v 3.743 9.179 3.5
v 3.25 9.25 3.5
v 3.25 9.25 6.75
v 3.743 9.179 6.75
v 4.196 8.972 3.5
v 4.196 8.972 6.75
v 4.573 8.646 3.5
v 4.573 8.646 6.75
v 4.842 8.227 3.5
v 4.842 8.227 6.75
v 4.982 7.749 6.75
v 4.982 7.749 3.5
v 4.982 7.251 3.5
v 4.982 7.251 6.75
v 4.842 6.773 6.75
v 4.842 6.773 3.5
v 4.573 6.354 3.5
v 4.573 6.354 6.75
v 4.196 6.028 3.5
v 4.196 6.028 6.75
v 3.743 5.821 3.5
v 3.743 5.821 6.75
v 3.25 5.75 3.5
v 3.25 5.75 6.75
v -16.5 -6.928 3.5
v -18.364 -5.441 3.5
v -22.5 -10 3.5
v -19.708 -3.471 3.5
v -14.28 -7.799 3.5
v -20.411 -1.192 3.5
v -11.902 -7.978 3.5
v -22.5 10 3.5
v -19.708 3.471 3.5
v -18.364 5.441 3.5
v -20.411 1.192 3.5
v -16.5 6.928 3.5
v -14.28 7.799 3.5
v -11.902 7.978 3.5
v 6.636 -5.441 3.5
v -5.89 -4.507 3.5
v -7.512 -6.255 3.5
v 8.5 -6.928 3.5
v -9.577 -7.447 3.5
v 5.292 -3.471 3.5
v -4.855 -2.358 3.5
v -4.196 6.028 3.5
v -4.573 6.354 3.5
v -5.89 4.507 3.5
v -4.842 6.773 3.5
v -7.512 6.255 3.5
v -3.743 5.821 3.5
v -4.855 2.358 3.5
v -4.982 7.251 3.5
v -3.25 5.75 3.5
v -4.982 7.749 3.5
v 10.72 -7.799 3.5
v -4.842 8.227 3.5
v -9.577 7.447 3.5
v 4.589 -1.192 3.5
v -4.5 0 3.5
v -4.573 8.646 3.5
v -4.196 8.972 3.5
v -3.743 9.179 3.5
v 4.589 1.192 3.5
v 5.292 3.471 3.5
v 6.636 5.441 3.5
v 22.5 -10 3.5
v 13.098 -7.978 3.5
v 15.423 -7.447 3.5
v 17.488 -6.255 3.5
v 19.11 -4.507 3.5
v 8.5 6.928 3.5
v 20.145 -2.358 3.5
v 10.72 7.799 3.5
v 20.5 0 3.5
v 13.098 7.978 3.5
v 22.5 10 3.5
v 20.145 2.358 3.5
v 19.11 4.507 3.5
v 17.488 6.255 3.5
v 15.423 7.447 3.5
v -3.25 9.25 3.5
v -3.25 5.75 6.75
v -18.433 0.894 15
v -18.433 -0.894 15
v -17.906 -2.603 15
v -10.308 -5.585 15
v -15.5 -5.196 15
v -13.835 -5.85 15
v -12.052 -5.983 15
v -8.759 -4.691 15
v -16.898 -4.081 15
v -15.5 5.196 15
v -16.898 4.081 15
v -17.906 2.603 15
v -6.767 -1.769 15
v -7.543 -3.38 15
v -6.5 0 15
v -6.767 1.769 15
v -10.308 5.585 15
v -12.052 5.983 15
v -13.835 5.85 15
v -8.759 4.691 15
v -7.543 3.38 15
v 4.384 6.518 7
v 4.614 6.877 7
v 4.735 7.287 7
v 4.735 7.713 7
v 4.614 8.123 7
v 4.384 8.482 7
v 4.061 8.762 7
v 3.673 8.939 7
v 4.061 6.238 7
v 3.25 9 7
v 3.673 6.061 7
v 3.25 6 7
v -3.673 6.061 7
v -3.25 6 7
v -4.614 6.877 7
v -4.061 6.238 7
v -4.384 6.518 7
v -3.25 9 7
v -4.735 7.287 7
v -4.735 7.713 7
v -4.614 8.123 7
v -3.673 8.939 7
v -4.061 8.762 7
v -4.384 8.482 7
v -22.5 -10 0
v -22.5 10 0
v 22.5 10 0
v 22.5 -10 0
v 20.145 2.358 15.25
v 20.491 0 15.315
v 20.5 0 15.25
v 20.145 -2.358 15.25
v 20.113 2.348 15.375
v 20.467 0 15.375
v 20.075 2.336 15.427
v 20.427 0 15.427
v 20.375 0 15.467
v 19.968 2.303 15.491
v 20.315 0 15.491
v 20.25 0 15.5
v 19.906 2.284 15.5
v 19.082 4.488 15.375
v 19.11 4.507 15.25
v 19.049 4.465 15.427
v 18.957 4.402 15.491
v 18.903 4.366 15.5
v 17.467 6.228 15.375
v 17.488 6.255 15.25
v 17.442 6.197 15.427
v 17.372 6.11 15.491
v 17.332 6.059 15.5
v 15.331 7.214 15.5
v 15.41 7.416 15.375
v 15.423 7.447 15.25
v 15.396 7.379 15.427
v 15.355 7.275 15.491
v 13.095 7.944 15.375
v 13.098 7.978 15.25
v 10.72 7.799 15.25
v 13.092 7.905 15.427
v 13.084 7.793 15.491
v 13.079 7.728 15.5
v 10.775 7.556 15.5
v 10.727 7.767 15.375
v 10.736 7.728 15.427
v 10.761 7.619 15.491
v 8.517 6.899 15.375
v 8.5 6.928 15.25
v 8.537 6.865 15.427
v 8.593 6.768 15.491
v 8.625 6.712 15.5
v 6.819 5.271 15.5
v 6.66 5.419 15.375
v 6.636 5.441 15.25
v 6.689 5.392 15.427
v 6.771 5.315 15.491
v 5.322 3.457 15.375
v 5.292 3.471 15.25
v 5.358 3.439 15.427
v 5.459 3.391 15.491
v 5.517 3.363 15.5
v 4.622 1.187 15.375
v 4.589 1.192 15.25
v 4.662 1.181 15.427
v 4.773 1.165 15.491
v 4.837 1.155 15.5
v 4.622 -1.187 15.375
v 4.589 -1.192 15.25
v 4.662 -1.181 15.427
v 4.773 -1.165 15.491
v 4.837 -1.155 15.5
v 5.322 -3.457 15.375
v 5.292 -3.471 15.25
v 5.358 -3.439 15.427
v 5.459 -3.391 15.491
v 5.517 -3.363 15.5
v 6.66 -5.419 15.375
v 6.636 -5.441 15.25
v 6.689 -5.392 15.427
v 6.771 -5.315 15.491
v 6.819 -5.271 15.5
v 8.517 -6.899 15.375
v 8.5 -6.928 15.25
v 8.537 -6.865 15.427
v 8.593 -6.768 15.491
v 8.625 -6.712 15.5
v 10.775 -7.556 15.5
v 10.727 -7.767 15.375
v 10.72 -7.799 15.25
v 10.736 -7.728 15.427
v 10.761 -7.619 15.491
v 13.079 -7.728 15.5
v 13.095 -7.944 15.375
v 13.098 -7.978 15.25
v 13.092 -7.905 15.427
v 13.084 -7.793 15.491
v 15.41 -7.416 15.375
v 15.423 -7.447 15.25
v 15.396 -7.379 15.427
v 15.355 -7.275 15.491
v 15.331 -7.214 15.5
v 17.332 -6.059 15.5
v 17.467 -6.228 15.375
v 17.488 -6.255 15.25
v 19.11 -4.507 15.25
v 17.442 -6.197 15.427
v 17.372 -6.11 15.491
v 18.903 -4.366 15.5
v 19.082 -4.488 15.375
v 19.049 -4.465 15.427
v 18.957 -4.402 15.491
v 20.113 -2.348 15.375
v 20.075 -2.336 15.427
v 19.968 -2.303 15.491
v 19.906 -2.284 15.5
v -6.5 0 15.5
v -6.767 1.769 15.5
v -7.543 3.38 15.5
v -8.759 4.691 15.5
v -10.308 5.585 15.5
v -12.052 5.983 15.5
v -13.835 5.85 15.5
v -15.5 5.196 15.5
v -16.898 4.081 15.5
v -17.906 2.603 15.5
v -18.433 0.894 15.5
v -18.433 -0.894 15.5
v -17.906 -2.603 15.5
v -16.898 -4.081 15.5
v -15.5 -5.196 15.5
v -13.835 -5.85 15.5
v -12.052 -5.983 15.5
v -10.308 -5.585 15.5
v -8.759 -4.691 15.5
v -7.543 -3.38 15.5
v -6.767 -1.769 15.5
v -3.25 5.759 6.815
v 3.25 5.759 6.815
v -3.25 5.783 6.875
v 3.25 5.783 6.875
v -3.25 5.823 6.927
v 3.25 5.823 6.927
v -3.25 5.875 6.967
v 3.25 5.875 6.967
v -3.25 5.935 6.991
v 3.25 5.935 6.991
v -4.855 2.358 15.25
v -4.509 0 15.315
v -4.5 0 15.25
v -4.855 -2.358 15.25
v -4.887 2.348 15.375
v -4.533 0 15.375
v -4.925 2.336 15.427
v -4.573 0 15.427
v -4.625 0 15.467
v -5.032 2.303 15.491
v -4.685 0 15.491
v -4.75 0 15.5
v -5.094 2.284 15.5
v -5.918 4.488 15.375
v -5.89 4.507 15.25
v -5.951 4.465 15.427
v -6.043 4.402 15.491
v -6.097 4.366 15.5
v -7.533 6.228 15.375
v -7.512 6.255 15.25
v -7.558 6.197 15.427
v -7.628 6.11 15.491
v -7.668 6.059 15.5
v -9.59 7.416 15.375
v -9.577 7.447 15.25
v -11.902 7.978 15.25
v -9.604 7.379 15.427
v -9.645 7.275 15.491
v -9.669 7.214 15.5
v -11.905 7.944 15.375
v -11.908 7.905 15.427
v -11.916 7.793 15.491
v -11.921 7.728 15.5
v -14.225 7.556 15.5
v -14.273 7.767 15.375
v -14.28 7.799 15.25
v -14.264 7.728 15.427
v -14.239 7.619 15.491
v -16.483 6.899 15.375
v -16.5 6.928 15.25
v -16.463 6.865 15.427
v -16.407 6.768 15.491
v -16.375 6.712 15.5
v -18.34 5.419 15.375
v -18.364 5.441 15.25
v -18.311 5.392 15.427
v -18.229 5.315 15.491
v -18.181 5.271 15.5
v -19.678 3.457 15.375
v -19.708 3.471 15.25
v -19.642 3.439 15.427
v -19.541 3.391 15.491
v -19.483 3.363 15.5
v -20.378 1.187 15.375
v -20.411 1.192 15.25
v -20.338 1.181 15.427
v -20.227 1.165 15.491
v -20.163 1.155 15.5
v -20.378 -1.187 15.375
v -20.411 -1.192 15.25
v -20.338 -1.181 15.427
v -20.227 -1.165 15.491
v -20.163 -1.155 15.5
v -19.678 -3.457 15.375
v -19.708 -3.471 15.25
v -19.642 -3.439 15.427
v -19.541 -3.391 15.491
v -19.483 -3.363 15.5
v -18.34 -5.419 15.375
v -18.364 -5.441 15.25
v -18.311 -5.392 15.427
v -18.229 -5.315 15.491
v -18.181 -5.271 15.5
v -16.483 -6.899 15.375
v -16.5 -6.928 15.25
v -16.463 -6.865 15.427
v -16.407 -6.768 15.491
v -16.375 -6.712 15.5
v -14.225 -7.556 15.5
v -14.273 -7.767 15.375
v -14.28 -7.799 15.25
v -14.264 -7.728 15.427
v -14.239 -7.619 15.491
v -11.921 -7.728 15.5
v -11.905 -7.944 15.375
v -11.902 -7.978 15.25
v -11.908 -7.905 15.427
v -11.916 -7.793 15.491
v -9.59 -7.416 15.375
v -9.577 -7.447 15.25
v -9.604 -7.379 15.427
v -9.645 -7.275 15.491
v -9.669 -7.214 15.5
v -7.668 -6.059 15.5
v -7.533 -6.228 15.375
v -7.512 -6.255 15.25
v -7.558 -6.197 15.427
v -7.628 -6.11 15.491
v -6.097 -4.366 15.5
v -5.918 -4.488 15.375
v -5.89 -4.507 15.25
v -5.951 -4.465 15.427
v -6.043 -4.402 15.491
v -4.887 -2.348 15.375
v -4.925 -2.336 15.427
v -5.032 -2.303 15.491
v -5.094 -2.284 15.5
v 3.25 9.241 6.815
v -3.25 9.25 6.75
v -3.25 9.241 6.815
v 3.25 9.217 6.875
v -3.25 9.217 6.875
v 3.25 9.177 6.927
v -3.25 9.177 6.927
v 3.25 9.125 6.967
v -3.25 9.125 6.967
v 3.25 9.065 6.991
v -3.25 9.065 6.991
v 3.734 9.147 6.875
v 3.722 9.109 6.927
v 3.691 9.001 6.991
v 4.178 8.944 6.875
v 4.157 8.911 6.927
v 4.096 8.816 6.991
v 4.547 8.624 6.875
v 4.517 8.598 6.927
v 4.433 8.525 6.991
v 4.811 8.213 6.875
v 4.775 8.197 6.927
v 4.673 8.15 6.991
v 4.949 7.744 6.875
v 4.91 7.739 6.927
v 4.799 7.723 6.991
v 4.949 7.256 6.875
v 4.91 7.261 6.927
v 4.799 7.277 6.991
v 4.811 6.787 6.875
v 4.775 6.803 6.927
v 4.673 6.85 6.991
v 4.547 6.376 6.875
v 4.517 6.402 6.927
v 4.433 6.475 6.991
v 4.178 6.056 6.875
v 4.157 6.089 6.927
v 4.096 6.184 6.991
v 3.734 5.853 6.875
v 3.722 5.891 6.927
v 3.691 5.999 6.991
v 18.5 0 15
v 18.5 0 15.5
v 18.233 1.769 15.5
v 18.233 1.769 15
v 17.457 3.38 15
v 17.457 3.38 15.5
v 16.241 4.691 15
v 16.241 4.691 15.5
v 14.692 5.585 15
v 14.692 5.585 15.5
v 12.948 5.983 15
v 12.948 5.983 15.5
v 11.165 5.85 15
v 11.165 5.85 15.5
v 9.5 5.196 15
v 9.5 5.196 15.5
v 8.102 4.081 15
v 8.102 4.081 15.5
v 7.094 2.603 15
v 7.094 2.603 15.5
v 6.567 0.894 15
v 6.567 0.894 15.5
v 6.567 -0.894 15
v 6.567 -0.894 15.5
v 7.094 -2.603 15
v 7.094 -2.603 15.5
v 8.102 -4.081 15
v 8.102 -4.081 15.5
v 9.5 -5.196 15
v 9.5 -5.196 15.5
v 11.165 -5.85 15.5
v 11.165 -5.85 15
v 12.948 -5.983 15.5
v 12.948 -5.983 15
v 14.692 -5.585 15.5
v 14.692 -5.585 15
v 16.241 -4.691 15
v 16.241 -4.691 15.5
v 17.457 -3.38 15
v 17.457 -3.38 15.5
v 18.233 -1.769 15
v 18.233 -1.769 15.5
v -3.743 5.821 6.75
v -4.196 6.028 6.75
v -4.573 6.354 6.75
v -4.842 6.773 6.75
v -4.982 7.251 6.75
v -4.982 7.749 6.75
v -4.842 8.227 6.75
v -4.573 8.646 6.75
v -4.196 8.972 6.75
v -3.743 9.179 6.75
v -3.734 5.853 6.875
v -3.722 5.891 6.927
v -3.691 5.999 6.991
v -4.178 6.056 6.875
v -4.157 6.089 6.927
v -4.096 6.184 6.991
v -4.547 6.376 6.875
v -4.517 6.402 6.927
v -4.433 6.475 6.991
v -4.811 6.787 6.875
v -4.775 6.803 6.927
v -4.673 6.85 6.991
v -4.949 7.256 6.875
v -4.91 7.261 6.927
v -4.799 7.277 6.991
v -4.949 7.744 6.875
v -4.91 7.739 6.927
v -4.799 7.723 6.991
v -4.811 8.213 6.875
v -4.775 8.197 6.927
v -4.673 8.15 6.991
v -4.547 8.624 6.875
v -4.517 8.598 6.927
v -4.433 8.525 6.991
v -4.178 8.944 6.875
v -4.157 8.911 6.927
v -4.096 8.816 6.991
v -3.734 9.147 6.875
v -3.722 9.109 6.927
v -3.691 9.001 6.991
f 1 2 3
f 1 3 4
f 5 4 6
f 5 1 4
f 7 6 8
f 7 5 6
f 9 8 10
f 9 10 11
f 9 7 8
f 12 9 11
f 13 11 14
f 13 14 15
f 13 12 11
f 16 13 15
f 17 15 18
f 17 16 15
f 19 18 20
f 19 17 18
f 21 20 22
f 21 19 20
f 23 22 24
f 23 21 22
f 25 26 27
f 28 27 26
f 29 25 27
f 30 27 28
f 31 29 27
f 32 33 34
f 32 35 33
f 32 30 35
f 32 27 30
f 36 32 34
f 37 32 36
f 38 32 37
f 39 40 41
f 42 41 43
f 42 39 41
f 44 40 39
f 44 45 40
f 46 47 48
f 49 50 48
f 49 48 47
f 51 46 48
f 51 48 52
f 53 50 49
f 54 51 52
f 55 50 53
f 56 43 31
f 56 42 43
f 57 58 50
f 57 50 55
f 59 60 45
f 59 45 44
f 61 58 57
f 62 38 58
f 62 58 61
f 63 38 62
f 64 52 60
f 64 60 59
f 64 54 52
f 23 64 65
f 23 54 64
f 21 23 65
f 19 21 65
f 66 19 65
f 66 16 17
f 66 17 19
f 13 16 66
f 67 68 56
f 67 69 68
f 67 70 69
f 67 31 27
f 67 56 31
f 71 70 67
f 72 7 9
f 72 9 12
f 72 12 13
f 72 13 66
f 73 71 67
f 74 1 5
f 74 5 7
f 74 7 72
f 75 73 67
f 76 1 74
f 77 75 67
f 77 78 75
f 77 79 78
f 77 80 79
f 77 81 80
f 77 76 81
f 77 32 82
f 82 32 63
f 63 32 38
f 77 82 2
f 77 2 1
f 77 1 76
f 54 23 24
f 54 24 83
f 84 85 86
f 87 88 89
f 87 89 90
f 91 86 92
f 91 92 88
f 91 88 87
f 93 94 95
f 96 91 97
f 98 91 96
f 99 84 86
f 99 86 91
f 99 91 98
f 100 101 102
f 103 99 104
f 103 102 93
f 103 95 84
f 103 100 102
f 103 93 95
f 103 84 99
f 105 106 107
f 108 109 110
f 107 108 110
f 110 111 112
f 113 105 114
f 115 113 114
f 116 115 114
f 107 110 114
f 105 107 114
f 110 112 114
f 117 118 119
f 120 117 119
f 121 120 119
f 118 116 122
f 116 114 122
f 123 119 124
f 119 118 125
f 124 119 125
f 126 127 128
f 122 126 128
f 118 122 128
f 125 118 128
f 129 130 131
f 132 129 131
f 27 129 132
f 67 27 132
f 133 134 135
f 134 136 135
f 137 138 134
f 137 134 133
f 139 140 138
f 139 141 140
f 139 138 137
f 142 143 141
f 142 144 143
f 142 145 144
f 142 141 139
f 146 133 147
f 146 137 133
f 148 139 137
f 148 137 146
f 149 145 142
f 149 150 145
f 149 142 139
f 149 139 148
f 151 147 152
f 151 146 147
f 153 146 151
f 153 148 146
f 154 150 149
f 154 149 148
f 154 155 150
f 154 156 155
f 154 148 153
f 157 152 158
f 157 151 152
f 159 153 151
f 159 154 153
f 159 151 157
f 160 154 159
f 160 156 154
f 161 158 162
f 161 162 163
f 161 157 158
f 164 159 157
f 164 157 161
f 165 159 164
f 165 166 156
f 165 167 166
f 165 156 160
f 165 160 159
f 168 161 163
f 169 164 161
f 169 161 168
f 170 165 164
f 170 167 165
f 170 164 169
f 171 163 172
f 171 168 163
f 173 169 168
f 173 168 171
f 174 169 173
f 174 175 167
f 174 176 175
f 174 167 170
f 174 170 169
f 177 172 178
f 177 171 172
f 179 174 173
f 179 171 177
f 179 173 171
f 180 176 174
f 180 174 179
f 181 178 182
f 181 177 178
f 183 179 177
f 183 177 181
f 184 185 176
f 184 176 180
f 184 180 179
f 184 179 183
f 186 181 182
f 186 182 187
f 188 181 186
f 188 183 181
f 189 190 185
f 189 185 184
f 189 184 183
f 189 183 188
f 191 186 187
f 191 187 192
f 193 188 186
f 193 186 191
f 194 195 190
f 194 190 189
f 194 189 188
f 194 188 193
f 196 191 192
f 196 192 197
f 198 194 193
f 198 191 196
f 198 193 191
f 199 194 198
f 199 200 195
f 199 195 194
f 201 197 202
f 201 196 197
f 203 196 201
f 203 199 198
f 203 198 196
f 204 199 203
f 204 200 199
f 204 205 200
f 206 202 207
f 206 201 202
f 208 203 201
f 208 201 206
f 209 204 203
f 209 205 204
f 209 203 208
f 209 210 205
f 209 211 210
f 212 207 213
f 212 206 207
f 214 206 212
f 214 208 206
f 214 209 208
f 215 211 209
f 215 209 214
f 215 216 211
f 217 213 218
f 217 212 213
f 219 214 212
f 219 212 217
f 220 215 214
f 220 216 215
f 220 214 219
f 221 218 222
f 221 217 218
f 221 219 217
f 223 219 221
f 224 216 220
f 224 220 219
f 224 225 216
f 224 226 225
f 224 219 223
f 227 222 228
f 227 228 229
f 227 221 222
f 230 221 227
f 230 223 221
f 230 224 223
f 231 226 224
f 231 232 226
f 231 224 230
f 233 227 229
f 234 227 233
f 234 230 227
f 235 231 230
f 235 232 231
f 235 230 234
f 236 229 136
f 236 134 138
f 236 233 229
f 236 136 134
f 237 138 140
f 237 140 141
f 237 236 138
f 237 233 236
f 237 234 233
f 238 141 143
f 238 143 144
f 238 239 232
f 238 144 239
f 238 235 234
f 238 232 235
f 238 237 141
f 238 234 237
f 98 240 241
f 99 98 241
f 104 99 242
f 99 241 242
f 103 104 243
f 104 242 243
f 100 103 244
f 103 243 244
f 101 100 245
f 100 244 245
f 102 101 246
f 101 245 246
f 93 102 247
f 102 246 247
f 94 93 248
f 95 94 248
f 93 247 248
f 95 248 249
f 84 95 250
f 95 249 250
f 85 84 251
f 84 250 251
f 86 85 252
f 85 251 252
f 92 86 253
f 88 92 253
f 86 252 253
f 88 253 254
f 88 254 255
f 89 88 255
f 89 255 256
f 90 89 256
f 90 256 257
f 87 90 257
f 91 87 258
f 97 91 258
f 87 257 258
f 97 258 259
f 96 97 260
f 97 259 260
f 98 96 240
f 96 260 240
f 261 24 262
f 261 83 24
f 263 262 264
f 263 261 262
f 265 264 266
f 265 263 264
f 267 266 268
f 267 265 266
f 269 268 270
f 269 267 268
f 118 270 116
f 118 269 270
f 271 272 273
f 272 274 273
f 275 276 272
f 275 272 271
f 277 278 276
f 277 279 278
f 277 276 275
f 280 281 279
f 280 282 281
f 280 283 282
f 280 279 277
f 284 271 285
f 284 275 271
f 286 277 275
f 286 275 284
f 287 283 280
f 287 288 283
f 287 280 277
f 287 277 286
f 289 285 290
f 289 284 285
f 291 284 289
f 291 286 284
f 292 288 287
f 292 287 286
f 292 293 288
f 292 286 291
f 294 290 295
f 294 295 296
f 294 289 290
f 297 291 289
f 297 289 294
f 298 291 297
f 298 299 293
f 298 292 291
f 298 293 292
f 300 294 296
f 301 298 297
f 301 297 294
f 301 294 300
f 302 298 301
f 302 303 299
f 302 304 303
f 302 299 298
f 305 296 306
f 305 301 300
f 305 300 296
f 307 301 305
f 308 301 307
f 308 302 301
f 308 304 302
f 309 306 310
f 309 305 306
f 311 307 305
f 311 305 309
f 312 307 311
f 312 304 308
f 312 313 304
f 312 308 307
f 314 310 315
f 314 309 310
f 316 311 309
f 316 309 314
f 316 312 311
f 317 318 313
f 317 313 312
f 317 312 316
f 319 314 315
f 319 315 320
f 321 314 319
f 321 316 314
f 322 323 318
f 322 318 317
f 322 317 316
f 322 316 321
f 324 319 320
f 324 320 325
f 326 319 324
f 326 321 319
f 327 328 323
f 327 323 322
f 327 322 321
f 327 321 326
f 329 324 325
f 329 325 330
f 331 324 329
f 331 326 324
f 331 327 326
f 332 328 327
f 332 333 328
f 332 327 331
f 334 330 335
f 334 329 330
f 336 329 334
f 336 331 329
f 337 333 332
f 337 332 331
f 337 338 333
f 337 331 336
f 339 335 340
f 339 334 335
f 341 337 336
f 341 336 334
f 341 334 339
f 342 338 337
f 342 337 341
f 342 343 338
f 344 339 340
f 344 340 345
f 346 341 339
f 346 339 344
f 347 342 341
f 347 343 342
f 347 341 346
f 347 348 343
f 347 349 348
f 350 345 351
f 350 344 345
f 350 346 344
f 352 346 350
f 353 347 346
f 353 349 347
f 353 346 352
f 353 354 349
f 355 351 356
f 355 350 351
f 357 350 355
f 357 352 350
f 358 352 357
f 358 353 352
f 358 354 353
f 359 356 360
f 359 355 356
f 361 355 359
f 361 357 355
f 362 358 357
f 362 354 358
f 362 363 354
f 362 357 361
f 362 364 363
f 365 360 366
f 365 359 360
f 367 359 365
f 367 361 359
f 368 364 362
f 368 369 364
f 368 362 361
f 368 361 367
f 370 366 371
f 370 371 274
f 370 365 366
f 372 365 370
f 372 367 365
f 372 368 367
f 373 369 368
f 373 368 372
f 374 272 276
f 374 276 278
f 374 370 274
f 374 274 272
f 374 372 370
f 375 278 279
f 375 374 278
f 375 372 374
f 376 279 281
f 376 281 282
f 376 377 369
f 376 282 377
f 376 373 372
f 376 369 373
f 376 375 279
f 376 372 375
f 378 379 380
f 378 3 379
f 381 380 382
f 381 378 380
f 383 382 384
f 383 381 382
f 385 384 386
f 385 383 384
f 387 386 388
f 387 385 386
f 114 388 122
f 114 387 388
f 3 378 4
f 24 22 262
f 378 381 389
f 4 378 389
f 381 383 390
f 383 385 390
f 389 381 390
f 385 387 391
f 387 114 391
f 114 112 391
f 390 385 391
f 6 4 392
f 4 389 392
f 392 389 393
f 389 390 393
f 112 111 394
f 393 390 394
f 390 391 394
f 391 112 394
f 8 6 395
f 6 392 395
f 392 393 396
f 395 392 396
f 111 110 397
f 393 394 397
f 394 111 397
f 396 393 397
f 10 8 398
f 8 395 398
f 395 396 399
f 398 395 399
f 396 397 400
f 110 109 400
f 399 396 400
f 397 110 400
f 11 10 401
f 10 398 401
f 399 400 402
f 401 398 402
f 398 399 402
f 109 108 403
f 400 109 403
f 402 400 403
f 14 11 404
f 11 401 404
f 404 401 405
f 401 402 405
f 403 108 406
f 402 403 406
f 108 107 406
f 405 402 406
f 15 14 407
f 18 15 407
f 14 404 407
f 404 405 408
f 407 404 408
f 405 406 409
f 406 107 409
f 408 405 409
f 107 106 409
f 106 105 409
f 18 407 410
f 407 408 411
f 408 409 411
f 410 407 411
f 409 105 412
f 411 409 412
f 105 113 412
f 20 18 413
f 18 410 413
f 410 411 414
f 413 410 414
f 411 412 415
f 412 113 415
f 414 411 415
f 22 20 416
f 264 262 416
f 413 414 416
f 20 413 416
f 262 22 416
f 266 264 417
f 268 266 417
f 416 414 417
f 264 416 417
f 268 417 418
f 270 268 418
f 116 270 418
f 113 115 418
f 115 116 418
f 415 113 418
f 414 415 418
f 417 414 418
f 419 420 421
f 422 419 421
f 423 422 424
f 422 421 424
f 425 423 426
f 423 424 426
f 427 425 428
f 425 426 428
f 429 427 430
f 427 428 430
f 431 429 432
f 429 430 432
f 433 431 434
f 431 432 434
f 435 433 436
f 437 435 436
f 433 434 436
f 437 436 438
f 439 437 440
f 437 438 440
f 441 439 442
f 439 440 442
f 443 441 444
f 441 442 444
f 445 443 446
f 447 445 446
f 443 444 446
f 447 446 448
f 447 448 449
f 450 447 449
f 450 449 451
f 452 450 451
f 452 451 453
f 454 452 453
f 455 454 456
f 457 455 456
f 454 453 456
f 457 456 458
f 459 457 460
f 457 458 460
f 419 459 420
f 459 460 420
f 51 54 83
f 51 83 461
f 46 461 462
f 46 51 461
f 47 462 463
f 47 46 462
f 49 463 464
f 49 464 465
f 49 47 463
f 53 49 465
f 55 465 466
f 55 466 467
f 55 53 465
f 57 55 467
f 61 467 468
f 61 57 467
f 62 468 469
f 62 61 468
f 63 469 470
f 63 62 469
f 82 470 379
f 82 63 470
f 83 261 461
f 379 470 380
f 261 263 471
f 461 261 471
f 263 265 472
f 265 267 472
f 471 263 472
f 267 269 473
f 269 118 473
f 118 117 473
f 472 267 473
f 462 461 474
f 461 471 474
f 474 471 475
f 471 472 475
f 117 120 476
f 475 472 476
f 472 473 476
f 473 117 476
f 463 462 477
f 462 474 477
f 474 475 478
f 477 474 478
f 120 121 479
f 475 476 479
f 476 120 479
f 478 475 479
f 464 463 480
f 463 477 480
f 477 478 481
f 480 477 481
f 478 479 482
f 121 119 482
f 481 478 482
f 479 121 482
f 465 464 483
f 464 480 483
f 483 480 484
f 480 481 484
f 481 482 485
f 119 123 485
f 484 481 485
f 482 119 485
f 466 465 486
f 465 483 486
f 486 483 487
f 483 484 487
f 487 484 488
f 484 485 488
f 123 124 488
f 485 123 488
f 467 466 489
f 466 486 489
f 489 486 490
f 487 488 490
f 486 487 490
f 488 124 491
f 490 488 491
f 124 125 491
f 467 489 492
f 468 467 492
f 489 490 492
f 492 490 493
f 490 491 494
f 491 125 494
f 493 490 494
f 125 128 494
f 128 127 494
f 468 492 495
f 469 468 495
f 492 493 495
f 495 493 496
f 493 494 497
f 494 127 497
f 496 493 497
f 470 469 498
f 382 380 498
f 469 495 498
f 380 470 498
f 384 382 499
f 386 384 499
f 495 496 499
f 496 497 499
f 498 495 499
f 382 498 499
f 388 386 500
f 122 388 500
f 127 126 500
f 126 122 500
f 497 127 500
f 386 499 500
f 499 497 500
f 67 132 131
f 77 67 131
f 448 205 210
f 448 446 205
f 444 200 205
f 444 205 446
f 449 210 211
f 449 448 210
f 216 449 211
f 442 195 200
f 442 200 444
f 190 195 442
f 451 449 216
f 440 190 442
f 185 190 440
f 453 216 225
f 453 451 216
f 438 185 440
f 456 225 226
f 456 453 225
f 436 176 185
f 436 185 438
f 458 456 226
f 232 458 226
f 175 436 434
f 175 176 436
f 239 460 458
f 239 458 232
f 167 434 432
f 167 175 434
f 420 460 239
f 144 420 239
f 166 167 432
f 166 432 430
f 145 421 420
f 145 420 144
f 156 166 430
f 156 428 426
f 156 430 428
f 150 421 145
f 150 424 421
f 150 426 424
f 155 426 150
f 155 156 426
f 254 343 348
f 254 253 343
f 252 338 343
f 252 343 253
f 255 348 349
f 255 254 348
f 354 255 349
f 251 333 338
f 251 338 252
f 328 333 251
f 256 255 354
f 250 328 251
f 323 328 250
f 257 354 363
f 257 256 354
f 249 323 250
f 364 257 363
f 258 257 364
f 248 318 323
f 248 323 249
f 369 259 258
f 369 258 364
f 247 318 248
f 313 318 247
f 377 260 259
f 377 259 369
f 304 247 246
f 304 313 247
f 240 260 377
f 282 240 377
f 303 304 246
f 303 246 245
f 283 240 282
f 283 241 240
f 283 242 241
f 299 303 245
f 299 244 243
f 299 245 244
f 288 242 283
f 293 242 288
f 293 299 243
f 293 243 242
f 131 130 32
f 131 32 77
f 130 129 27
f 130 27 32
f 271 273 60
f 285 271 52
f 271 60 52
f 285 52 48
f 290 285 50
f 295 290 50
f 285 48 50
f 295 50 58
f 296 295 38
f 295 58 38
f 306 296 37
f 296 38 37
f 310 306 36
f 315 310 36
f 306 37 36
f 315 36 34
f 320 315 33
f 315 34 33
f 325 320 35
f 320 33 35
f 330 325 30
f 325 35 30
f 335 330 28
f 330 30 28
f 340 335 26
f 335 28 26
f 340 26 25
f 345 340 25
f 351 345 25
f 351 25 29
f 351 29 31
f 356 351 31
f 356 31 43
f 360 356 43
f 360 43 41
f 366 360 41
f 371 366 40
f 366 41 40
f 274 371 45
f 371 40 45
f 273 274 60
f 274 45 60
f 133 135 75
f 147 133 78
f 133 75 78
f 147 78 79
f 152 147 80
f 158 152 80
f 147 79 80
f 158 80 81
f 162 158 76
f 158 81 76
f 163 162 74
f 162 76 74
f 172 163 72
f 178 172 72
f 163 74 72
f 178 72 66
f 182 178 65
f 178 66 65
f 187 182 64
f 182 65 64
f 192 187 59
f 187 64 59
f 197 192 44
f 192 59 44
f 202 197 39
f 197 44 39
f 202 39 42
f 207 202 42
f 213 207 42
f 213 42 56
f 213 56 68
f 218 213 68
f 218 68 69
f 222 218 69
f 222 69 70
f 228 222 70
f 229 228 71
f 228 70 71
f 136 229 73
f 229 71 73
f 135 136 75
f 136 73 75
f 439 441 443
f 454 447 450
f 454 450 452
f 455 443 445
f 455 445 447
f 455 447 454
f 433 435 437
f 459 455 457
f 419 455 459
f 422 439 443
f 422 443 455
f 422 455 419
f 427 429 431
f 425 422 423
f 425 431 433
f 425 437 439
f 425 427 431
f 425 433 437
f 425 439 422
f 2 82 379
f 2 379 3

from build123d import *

# Parameters (mm, degrees)
SKETCH1_W           = 45
SKETCH1_H           = 20
BOSS_EXTRUDE1_DEPTH = 3.5
SKETCH2_R           = 8
BOSS_EXTRUDE2_DEPTH = 12
SKETCH3_R           = 6
CUT_EXTRUDE1_DEPTH  = 0.5
FILLET1_R           = 0.25
BOSS_EXTRUDE3_DEPTH = 3.5
FILLET2_R           = 0.25


with BuildPart() as part:
    # Sketch1 → Boss-Extrude1 (new body)
    with BuildSketch(Plane.XY):
        Rectangle(SKETCH1_W, SKETCH1_H)
    extrude(amount=BOSS_EXTRUDE1_DEPTH)

    # Sketch2 → Boss-Extrude2 (add)
    with BuildSketch(Plane.XY.offset(3.5)):
        with Locations((12.5, 0)):
            Circle(SKETCH2_R)
        with Locations((-12.5, 0)):
            Circle(SKETCH2_R)
    extrude(amount=BOSS_EXTRUDE2_DEPTH)

    # Sketch3 → Cut-Extrude1 (cut)
    with BuildSketch(Plane.XY.offset(15.5)):
        with Locations((-12.5, 0)):
            Circle(SKETCH3_R)
        with Locations((12.5, 0)):
            Circle(SKETCH3_R)
    extrude(amount=-CUT_EXTRUDE1_DEPTH, mode=Mode.SUBTRACT)

    # Fillet1
    fillet1_edges = [part.edges().sort_by_distance(p)[0] for p in [
        (4.5, 0, 15.5),
        (-20.5, 0, 15.5),
    ]]
    fillet(fillet1_edges, radius=FILLET1_R)

    # Sketch4 → Boss-Extrude3 (add)
    with BuildSketch(Plane.XY.offset(3.5)):
        with BuildLine():
            Line((-3.25, 9.25), (3.25, 9.25))
            ThreePointArc((3.25, 9.25), (5, 7.5), (3.25, 5.75))
            Line((3.25, 5.75), (-3.25, 5.75))
            ThreePointArc((-3.25, 5.75), (-5, 7.5), (-3.25, 9.25))
        make_face()
    extrude(amount=BOSS_EXTRUDE3_DEPTH)

    # Fillet2
    fillet2_edges = [part.edges().sort_by_distance(p)[0] for p in [
        (-5, 7.5, 7),
        (0, 5.75, 7),
        (5, 7.5, 7),
        (0, 9.25, 7),
    ]]
    fillet(fillet2_edges, radius=FILLET2_R)


solid = part.part
